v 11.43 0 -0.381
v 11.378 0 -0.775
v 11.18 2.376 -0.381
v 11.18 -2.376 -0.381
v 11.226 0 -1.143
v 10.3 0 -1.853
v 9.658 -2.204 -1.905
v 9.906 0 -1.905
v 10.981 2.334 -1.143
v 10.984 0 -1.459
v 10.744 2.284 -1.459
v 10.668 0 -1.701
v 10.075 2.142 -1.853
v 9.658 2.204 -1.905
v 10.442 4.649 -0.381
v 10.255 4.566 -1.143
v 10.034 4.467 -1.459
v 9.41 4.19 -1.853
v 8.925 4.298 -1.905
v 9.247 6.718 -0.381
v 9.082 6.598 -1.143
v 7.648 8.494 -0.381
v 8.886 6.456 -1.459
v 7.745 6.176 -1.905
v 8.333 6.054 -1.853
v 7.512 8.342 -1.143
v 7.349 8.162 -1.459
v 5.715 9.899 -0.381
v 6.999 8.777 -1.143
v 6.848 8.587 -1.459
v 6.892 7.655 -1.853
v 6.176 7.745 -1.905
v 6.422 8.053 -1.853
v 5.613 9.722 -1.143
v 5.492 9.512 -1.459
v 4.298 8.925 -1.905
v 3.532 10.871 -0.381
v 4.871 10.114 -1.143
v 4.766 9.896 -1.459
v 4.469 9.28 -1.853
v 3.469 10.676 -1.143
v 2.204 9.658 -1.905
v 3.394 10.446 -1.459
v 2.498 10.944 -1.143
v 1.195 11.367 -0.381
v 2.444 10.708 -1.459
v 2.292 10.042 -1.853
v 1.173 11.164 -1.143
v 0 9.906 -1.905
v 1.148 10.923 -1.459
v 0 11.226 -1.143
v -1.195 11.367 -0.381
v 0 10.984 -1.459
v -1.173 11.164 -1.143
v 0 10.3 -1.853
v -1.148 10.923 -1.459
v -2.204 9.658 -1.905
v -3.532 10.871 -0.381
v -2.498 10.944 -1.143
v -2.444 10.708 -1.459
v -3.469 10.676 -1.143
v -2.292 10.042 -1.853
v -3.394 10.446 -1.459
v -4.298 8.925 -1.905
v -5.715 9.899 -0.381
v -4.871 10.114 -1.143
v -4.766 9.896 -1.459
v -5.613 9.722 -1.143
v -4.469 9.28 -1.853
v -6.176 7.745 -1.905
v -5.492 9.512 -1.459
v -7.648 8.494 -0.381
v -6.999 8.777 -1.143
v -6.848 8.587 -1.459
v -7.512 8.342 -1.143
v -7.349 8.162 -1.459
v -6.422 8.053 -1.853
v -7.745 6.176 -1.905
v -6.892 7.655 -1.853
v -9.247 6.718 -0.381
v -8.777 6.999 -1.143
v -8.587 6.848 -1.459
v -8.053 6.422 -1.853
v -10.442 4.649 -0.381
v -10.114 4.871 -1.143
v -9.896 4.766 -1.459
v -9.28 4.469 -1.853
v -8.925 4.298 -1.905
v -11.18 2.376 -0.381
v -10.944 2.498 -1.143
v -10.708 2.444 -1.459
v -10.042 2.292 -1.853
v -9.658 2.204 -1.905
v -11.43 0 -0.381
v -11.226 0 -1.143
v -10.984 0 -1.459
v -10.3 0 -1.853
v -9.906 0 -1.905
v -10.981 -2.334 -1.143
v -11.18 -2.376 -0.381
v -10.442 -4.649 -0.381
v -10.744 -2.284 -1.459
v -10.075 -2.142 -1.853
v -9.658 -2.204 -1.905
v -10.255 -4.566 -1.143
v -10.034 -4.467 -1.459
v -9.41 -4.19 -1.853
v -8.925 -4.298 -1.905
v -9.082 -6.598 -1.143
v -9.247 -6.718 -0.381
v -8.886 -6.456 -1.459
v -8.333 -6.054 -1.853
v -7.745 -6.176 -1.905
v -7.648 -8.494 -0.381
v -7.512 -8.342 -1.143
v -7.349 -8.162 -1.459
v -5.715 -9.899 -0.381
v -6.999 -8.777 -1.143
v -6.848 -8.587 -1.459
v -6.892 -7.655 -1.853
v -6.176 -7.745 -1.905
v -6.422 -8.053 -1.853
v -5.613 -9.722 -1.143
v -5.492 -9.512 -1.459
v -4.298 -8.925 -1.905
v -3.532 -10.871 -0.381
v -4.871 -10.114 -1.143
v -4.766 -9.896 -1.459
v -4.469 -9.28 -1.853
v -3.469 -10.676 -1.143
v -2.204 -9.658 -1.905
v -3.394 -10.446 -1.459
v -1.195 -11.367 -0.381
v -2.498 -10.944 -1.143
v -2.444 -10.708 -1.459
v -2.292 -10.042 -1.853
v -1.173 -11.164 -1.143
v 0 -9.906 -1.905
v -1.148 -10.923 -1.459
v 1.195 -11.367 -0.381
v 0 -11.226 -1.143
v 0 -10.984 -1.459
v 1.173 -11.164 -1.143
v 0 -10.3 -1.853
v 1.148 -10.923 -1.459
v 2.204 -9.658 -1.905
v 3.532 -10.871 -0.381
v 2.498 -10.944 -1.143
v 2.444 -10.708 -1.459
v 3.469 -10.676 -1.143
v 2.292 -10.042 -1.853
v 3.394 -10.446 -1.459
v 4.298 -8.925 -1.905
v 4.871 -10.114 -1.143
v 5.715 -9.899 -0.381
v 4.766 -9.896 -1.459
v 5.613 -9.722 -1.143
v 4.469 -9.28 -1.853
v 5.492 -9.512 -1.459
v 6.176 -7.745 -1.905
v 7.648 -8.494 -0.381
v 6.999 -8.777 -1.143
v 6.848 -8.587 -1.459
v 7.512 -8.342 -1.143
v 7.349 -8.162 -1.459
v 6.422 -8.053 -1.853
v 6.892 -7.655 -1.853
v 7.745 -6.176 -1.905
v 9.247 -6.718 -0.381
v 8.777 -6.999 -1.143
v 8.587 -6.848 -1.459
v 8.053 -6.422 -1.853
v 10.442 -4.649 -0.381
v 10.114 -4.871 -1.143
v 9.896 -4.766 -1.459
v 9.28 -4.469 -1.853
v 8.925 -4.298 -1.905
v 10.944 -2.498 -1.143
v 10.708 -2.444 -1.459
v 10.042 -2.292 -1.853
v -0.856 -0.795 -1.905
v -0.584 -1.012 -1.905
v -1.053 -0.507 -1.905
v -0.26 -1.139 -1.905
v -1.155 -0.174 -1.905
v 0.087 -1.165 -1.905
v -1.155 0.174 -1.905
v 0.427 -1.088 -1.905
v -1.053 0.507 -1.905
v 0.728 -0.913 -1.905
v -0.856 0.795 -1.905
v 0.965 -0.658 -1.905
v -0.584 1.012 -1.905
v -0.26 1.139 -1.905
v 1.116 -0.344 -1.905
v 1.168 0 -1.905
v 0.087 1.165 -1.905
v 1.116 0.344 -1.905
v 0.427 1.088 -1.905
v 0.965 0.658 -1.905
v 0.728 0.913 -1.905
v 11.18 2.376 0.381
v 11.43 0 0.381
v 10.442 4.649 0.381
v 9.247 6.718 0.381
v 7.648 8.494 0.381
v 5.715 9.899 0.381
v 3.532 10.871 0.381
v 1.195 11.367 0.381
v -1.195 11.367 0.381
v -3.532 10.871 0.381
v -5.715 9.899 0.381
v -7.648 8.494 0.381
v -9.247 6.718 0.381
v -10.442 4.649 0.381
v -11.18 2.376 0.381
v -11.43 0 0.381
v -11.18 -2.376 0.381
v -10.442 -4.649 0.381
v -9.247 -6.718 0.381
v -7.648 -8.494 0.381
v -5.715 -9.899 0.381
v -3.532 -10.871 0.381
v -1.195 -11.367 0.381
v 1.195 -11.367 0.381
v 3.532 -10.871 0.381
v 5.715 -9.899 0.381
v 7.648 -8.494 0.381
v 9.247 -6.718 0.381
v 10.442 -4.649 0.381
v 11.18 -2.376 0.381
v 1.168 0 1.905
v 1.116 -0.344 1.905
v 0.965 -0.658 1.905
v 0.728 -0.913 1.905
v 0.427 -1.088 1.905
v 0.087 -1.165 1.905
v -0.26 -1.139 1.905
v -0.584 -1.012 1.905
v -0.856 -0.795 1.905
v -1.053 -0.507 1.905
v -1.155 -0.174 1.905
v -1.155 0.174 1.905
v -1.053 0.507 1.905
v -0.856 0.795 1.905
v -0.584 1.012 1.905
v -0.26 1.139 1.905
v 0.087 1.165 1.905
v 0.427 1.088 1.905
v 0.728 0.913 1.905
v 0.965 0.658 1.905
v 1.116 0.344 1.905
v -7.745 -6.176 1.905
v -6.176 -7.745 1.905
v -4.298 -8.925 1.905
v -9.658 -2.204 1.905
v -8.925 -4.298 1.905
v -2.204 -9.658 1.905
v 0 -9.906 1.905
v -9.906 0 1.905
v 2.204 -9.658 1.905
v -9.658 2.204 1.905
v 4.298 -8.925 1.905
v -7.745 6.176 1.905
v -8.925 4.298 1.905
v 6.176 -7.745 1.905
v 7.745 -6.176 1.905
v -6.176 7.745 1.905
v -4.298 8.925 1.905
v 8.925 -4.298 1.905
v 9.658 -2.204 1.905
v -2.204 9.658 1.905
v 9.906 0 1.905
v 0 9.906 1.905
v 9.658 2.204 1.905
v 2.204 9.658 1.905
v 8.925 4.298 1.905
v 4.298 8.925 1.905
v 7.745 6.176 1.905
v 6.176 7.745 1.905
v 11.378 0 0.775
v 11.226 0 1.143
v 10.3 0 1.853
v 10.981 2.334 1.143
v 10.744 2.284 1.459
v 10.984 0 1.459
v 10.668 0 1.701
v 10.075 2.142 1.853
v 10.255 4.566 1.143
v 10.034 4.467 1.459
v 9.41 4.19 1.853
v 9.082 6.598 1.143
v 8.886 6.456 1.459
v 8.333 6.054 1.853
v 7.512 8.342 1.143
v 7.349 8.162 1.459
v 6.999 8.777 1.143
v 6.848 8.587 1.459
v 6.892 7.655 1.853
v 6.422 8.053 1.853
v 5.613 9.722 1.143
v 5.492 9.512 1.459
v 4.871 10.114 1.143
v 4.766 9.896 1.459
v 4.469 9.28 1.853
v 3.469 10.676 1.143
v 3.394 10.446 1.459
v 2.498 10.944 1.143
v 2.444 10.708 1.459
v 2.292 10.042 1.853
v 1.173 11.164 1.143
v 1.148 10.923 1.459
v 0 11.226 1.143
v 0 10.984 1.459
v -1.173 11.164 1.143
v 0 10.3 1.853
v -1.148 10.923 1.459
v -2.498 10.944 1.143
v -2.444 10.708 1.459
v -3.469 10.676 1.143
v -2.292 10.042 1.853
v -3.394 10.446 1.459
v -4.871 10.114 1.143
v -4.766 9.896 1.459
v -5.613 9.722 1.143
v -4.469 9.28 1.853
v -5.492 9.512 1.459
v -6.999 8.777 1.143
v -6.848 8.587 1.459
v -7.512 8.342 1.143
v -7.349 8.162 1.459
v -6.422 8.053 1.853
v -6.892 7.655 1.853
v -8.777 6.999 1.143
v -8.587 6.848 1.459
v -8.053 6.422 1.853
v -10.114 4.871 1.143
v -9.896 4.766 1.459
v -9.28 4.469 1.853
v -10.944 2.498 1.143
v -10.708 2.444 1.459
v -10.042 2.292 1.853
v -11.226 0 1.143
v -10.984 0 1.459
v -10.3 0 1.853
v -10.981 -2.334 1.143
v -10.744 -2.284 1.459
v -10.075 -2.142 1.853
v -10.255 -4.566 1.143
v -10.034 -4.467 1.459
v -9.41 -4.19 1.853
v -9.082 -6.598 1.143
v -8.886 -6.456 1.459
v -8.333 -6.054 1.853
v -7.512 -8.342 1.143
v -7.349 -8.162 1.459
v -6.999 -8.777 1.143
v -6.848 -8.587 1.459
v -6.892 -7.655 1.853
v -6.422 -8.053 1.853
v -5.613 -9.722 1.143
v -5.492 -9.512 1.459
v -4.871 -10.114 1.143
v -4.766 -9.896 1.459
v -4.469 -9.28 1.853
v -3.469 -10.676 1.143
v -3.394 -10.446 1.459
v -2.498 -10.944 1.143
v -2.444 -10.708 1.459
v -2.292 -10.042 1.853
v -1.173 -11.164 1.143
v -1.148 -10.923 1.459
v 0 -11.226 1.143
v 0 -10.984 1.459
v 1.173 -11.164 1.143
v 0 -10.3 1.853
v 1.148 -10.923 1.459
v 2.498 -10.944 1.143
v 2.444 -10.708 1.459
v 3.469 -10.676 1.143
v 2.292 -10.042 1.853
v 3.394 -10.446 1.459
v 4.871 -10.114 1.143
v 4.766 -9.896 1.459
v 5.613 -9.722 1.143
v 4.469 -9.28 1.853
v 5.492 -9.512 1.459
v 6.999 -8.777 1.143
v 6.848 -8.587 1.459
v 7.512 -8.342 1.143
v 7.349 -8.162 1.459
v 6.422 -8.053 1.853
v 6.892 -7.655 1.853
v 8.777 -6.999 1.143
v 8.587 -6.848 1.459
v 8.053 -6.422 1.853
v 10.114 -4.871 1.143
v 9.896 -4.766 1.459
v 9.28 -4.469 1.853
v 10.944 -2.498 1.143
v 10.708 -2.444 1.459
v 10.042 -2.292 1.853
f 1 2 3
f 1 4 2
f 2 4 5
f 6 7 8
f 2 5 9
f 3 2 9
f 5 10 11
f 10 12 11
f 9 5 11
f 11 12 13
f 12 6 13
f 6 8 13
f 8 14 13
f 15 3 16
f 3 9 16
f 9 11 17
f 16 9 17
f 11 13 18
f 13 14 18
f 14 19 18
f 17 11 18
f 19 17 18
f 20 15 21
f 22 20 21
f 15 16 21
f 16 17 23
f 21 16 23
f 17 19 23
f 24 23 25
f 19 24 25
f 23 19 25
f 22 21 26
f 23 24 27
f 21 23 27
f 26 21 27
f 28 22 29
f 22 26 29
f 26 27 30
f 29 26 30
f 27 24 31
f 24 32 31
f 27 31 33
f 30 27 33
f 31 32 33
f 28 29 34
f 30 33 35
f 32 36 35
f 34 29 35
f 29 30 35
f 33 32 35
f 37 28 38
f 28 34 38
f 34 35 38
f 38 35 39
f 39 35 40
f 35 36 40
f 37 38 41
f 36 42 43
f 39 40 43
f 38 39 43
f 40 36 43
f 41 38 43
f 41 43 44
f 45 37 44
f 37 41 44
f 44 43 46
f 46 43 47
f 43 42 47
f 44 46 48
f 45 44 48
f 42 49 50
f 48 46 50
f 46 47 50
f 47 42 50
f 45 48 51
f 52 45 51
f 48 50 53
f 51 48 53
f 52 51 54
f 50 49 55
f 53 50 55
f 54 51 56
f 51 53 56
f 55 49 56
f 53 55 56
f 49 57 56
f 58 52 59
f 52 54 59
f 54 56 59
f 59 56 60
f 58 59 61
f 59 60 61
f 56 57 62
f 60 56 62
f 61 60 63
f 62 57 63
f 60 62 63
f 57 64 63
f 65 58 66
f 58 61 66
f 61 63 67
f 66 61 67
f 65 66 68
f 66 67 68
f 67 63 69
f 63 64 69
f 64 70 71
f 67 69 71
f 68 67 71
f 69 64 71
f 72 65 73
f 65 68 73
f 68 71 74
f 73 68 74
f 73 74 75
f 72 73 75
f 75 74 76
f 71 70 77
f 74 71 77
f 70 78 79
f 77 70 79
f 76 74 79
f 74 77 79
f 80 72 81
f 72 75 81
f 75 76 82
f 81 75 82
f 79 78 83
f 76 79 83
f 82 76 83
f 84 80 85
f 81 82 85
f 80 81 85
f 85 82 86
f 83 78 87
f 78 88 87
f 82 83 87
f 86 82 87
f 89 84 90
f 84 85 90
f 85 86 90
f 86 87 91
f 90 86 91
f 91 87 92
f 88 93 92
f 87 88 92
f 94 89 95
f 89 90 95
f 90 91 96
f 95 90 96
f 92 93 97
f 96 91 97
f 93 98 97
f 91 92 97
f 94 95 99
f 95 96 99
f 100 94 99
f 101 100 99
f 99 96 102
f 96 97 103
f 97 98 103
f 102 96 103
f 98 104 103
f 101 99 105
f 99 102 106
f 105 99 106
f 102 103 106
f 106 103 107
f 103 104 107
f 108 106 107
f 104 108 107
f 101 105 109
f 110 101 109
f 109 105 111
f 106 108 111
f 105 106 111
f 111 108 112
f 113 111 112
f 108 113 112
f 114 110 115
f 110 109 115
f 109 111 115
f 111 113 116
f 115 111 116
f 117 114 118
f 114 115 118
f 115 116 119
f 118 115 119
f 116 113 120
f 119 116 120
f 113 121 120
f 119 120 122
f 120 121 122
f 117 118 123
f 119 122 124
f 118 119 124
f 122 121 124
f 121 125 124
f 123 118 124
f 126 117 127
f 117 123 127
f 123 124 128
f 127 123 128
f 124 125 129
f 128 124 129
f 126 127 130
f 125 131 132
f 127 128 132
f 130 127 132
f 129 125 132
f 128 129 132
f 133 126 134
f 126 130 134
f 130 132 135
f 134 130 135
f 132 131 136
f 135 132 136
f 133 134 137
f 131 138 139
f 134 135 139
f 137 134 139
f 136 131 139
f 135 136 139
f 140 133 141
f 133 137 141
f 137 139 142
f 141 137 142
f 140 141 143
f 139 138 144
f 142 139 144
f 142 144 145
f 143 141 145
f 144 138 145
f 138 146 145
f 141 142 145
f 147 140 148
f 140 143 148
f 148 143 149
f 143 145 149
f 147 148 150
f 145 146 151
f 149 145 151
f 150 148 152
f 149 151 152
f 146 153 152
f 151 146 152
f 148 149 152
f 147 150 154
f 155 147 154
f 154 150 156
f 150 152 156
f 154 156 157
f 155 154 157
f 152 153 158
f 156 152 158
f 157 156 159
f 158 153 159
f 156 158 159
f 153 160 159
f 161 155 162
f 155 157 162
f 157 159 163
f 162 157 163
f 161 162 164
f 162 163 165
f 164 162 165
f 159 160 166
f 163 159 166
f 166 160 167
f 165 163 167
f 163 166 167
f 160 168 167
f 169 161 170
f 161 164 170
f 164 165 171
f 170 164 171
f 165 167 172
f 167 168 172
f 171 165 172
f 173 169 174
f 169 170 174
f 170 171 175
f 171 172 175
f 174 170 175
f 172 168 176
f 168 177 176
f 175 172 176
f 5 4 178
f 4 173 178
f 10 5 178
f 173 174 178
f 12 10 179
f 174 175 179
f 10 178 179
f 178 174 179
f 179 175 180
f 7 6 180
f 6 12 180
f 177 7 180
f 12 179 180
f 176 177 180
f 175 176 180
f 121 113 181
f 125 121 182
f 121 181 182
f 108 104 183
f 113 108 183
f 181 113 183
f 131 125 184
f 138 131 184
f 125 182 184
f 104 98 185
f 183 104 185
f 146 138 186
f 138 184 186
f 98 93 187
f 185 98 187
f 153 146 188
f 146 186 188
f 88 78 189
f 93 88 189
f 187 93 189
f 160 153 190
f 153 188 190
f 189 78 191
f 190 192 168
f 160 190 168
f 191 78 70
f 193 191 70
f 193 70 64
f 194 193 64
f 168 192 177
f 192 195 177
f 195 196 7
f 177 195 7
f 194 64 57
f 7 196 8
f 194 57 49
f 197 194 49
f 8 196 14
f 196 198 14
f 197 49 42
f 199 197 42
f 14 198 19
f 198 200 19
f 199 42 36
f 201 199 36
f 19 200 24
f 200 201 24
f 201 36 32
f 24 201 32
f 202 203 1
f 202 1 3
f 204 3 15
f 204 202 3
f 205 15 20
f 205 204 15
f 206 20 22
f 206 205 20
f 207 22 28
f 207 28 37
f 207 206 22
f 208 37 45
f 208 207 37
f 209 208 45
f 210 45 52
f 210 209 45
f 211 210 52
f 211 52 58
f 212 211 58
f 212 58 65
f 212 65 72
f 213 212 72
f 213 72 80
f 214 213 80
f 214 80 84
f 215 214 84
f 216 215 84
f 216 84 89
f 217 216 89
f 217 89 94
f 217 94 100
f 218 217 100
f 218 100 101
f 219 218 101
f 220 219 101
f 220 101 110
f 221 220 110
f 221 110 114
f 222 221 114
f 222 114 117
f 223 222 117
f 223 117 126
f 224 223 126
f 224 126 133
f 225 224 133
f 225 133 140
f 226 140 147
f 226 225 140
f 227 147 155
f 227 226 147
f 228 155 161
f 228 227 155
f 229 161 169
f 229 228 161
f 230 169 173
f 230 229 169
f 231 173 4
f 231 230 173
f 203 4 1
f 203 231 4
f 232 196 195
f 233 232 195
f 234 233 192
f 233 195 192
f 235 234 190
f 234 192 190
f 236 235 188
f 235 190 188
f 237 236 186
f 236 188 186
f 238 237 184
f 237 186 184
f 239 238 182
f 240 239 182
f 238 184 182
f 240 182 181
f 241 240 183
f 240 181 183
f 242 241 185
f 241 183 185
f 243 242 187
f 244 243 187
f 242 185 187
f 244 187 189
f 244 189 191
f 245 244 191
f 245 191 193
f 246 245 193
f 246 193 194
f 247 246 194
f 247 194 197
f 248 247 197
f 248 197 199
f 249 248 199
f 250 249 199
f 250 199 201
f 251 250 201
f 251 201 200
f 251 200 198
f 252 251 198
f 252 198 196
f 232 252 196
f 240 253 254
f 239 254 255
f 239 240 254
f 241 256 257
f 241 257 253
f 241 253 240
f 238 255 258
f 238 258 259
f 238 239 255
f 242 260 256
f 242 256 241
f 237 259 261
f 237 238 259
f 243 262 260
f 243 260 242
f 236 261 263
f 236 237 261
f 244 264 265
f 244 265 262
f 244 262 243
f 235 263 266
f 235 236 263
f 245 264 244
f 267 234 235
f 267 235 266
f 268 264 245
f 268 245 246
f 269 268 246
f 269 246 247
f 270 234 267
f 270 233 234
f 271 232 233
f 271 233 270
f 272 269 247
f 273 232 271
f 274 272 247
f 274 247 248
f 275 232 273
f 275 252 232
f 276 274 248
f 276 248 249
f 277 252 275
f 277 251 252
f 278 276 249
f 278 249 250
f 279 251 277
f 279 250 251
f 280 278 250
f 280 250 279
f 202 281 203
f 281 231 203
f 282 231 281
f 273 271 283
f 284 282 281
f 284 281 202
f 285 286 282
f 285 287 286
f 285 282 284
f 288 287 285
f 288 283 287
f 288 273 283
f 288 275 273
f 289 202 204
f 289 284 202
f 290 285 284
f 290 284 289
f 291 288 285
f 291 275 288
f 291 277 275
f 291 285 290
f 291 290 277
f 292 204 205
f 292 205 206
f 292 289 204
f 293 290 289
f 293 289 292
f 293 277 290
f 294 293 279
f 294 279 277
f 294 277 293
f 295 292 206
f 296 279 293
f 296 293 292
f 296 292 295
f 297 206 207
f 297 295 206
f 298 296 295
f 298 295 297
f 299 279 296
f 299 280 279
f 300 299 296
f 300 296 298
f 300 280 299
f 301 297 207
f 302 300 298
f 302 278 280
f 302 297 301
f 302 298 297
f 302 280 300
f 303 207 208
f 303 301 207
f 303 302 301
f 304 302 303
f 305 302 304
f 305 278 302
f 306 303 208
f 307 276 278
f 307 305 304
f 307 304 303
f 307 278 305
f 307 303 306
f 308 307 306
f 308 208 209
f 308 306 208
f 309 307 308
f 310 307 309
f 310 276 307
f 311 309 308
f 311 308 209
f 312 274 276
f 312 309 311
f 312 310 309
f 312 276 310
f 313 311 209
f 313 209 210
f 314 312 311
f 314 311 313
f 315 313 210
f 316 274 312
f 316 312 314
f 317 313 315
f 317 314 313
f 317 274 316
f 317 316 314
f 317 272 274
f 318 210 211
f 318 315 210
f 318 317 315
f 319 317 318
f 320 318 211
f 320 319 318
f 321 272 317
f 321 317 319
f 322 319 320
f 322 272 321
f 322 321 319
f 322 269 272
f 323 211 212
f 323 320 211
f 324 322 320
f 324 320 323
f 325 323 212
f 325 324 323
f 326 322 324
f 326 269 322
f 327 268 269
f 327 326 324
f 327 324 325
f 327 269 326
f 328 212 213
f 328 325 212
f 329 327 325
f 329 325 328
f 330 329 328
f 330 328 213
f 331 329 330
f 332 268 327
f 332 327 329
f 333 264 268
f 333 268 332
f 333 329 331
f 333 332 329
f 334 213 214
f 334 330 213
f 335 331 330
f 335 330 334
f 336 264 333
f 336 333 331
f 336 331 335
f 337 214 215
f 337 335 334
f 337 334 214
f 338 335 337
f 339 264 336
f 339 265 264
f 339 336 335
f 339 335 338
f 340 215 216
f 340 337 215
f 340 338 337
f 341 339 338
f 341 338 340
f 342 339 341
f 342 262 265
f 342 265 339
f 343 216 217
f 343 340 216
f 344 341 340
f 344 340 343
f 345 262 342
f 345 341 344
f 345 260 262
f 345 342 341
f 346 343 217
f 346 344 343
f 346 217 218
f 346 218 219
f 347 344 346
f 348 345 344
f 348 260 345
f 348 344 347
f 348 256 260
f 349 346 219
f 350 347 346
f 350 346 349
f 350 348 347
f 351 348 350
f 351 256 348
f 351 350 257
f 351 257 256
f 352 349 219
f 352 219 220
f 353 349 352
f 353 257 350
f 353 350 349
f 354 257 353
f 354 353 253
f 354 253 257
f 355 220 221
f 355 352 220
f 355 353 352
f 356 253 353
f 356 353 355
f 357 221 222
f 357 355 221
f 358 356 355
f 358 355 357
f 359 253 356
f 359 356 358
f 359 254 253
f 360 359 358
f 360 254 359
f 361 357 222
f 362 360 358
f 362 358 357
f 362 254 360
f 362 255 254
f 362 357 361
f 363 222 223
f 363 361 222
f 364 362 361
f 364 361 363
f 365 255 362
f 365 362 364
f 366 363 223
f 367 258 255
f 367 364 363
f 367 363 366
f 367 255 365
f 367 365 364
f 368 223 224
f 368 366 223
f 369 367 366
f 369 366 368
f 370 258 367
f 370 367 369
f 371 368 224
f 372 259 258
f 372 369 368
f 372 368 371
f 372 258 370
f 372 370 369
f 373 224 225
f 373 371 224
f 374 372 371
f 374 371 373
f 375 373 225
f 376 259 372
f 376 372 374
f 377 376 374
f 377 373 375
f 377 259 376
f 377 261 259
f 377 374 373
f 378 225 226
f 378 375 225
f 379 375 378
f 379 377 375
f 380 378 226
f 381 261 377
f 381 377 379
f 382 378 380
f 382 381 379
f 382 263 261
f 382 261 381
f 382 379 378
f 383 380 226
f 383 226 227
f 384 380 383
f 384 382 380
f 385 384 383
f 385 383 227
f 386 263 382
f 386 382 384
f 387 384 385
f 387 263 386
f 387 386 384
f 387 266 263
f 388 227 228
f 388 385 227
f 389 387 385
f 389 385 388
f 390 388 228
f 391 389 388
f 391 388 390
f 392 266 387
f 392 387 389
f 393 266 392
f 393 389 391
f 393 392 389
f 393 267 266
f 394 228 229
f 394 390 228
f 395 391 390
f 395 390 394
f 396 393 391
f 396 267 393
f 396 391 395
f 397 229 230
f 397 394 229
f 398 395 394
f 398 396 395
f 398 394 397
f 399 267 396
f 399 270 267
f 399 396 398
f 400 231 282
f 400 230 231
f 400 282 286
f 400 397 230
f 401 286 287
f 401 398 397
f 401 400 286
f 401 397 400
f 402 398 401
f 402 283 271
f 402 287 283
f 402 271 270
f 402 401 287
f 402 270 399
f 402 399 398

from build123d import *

# Parameters (mm, degrees)
F0_R     = 11.43
F1_DEPTH = 1.905
F2_R     = 1.1684
F3_DEPTH = 25.4
F4_R     = 1.524


with BuildPart() as f1:
    # F0 (on Top) → F1 (new body, symmetric)
    with BuildSketch(Plane.XY):
        Circle(F0_R)
    extrude(amount=F1_DEPTH, both=True)

    # F2 (on face) → F3 (cut)
    with BuildSketch(Plane(origin=(0, 0, -1.905), x_dir=(1, 0, 0), z_dir=(0, 0, -1))):
        Circle(F2_R)
    extrude(amount=-F3_DEPTH, mode=Mode.SUBTRACT)

    # F4
    f4_edges = [f1.edges().sort_by_distance(p)[0] for p in [
        (-11.43, 0, 1.905),
        (-11.43, 0, -1.905),
    ]]
    fillet(f4_edges, radius=F4_R)


solid = f1.part
